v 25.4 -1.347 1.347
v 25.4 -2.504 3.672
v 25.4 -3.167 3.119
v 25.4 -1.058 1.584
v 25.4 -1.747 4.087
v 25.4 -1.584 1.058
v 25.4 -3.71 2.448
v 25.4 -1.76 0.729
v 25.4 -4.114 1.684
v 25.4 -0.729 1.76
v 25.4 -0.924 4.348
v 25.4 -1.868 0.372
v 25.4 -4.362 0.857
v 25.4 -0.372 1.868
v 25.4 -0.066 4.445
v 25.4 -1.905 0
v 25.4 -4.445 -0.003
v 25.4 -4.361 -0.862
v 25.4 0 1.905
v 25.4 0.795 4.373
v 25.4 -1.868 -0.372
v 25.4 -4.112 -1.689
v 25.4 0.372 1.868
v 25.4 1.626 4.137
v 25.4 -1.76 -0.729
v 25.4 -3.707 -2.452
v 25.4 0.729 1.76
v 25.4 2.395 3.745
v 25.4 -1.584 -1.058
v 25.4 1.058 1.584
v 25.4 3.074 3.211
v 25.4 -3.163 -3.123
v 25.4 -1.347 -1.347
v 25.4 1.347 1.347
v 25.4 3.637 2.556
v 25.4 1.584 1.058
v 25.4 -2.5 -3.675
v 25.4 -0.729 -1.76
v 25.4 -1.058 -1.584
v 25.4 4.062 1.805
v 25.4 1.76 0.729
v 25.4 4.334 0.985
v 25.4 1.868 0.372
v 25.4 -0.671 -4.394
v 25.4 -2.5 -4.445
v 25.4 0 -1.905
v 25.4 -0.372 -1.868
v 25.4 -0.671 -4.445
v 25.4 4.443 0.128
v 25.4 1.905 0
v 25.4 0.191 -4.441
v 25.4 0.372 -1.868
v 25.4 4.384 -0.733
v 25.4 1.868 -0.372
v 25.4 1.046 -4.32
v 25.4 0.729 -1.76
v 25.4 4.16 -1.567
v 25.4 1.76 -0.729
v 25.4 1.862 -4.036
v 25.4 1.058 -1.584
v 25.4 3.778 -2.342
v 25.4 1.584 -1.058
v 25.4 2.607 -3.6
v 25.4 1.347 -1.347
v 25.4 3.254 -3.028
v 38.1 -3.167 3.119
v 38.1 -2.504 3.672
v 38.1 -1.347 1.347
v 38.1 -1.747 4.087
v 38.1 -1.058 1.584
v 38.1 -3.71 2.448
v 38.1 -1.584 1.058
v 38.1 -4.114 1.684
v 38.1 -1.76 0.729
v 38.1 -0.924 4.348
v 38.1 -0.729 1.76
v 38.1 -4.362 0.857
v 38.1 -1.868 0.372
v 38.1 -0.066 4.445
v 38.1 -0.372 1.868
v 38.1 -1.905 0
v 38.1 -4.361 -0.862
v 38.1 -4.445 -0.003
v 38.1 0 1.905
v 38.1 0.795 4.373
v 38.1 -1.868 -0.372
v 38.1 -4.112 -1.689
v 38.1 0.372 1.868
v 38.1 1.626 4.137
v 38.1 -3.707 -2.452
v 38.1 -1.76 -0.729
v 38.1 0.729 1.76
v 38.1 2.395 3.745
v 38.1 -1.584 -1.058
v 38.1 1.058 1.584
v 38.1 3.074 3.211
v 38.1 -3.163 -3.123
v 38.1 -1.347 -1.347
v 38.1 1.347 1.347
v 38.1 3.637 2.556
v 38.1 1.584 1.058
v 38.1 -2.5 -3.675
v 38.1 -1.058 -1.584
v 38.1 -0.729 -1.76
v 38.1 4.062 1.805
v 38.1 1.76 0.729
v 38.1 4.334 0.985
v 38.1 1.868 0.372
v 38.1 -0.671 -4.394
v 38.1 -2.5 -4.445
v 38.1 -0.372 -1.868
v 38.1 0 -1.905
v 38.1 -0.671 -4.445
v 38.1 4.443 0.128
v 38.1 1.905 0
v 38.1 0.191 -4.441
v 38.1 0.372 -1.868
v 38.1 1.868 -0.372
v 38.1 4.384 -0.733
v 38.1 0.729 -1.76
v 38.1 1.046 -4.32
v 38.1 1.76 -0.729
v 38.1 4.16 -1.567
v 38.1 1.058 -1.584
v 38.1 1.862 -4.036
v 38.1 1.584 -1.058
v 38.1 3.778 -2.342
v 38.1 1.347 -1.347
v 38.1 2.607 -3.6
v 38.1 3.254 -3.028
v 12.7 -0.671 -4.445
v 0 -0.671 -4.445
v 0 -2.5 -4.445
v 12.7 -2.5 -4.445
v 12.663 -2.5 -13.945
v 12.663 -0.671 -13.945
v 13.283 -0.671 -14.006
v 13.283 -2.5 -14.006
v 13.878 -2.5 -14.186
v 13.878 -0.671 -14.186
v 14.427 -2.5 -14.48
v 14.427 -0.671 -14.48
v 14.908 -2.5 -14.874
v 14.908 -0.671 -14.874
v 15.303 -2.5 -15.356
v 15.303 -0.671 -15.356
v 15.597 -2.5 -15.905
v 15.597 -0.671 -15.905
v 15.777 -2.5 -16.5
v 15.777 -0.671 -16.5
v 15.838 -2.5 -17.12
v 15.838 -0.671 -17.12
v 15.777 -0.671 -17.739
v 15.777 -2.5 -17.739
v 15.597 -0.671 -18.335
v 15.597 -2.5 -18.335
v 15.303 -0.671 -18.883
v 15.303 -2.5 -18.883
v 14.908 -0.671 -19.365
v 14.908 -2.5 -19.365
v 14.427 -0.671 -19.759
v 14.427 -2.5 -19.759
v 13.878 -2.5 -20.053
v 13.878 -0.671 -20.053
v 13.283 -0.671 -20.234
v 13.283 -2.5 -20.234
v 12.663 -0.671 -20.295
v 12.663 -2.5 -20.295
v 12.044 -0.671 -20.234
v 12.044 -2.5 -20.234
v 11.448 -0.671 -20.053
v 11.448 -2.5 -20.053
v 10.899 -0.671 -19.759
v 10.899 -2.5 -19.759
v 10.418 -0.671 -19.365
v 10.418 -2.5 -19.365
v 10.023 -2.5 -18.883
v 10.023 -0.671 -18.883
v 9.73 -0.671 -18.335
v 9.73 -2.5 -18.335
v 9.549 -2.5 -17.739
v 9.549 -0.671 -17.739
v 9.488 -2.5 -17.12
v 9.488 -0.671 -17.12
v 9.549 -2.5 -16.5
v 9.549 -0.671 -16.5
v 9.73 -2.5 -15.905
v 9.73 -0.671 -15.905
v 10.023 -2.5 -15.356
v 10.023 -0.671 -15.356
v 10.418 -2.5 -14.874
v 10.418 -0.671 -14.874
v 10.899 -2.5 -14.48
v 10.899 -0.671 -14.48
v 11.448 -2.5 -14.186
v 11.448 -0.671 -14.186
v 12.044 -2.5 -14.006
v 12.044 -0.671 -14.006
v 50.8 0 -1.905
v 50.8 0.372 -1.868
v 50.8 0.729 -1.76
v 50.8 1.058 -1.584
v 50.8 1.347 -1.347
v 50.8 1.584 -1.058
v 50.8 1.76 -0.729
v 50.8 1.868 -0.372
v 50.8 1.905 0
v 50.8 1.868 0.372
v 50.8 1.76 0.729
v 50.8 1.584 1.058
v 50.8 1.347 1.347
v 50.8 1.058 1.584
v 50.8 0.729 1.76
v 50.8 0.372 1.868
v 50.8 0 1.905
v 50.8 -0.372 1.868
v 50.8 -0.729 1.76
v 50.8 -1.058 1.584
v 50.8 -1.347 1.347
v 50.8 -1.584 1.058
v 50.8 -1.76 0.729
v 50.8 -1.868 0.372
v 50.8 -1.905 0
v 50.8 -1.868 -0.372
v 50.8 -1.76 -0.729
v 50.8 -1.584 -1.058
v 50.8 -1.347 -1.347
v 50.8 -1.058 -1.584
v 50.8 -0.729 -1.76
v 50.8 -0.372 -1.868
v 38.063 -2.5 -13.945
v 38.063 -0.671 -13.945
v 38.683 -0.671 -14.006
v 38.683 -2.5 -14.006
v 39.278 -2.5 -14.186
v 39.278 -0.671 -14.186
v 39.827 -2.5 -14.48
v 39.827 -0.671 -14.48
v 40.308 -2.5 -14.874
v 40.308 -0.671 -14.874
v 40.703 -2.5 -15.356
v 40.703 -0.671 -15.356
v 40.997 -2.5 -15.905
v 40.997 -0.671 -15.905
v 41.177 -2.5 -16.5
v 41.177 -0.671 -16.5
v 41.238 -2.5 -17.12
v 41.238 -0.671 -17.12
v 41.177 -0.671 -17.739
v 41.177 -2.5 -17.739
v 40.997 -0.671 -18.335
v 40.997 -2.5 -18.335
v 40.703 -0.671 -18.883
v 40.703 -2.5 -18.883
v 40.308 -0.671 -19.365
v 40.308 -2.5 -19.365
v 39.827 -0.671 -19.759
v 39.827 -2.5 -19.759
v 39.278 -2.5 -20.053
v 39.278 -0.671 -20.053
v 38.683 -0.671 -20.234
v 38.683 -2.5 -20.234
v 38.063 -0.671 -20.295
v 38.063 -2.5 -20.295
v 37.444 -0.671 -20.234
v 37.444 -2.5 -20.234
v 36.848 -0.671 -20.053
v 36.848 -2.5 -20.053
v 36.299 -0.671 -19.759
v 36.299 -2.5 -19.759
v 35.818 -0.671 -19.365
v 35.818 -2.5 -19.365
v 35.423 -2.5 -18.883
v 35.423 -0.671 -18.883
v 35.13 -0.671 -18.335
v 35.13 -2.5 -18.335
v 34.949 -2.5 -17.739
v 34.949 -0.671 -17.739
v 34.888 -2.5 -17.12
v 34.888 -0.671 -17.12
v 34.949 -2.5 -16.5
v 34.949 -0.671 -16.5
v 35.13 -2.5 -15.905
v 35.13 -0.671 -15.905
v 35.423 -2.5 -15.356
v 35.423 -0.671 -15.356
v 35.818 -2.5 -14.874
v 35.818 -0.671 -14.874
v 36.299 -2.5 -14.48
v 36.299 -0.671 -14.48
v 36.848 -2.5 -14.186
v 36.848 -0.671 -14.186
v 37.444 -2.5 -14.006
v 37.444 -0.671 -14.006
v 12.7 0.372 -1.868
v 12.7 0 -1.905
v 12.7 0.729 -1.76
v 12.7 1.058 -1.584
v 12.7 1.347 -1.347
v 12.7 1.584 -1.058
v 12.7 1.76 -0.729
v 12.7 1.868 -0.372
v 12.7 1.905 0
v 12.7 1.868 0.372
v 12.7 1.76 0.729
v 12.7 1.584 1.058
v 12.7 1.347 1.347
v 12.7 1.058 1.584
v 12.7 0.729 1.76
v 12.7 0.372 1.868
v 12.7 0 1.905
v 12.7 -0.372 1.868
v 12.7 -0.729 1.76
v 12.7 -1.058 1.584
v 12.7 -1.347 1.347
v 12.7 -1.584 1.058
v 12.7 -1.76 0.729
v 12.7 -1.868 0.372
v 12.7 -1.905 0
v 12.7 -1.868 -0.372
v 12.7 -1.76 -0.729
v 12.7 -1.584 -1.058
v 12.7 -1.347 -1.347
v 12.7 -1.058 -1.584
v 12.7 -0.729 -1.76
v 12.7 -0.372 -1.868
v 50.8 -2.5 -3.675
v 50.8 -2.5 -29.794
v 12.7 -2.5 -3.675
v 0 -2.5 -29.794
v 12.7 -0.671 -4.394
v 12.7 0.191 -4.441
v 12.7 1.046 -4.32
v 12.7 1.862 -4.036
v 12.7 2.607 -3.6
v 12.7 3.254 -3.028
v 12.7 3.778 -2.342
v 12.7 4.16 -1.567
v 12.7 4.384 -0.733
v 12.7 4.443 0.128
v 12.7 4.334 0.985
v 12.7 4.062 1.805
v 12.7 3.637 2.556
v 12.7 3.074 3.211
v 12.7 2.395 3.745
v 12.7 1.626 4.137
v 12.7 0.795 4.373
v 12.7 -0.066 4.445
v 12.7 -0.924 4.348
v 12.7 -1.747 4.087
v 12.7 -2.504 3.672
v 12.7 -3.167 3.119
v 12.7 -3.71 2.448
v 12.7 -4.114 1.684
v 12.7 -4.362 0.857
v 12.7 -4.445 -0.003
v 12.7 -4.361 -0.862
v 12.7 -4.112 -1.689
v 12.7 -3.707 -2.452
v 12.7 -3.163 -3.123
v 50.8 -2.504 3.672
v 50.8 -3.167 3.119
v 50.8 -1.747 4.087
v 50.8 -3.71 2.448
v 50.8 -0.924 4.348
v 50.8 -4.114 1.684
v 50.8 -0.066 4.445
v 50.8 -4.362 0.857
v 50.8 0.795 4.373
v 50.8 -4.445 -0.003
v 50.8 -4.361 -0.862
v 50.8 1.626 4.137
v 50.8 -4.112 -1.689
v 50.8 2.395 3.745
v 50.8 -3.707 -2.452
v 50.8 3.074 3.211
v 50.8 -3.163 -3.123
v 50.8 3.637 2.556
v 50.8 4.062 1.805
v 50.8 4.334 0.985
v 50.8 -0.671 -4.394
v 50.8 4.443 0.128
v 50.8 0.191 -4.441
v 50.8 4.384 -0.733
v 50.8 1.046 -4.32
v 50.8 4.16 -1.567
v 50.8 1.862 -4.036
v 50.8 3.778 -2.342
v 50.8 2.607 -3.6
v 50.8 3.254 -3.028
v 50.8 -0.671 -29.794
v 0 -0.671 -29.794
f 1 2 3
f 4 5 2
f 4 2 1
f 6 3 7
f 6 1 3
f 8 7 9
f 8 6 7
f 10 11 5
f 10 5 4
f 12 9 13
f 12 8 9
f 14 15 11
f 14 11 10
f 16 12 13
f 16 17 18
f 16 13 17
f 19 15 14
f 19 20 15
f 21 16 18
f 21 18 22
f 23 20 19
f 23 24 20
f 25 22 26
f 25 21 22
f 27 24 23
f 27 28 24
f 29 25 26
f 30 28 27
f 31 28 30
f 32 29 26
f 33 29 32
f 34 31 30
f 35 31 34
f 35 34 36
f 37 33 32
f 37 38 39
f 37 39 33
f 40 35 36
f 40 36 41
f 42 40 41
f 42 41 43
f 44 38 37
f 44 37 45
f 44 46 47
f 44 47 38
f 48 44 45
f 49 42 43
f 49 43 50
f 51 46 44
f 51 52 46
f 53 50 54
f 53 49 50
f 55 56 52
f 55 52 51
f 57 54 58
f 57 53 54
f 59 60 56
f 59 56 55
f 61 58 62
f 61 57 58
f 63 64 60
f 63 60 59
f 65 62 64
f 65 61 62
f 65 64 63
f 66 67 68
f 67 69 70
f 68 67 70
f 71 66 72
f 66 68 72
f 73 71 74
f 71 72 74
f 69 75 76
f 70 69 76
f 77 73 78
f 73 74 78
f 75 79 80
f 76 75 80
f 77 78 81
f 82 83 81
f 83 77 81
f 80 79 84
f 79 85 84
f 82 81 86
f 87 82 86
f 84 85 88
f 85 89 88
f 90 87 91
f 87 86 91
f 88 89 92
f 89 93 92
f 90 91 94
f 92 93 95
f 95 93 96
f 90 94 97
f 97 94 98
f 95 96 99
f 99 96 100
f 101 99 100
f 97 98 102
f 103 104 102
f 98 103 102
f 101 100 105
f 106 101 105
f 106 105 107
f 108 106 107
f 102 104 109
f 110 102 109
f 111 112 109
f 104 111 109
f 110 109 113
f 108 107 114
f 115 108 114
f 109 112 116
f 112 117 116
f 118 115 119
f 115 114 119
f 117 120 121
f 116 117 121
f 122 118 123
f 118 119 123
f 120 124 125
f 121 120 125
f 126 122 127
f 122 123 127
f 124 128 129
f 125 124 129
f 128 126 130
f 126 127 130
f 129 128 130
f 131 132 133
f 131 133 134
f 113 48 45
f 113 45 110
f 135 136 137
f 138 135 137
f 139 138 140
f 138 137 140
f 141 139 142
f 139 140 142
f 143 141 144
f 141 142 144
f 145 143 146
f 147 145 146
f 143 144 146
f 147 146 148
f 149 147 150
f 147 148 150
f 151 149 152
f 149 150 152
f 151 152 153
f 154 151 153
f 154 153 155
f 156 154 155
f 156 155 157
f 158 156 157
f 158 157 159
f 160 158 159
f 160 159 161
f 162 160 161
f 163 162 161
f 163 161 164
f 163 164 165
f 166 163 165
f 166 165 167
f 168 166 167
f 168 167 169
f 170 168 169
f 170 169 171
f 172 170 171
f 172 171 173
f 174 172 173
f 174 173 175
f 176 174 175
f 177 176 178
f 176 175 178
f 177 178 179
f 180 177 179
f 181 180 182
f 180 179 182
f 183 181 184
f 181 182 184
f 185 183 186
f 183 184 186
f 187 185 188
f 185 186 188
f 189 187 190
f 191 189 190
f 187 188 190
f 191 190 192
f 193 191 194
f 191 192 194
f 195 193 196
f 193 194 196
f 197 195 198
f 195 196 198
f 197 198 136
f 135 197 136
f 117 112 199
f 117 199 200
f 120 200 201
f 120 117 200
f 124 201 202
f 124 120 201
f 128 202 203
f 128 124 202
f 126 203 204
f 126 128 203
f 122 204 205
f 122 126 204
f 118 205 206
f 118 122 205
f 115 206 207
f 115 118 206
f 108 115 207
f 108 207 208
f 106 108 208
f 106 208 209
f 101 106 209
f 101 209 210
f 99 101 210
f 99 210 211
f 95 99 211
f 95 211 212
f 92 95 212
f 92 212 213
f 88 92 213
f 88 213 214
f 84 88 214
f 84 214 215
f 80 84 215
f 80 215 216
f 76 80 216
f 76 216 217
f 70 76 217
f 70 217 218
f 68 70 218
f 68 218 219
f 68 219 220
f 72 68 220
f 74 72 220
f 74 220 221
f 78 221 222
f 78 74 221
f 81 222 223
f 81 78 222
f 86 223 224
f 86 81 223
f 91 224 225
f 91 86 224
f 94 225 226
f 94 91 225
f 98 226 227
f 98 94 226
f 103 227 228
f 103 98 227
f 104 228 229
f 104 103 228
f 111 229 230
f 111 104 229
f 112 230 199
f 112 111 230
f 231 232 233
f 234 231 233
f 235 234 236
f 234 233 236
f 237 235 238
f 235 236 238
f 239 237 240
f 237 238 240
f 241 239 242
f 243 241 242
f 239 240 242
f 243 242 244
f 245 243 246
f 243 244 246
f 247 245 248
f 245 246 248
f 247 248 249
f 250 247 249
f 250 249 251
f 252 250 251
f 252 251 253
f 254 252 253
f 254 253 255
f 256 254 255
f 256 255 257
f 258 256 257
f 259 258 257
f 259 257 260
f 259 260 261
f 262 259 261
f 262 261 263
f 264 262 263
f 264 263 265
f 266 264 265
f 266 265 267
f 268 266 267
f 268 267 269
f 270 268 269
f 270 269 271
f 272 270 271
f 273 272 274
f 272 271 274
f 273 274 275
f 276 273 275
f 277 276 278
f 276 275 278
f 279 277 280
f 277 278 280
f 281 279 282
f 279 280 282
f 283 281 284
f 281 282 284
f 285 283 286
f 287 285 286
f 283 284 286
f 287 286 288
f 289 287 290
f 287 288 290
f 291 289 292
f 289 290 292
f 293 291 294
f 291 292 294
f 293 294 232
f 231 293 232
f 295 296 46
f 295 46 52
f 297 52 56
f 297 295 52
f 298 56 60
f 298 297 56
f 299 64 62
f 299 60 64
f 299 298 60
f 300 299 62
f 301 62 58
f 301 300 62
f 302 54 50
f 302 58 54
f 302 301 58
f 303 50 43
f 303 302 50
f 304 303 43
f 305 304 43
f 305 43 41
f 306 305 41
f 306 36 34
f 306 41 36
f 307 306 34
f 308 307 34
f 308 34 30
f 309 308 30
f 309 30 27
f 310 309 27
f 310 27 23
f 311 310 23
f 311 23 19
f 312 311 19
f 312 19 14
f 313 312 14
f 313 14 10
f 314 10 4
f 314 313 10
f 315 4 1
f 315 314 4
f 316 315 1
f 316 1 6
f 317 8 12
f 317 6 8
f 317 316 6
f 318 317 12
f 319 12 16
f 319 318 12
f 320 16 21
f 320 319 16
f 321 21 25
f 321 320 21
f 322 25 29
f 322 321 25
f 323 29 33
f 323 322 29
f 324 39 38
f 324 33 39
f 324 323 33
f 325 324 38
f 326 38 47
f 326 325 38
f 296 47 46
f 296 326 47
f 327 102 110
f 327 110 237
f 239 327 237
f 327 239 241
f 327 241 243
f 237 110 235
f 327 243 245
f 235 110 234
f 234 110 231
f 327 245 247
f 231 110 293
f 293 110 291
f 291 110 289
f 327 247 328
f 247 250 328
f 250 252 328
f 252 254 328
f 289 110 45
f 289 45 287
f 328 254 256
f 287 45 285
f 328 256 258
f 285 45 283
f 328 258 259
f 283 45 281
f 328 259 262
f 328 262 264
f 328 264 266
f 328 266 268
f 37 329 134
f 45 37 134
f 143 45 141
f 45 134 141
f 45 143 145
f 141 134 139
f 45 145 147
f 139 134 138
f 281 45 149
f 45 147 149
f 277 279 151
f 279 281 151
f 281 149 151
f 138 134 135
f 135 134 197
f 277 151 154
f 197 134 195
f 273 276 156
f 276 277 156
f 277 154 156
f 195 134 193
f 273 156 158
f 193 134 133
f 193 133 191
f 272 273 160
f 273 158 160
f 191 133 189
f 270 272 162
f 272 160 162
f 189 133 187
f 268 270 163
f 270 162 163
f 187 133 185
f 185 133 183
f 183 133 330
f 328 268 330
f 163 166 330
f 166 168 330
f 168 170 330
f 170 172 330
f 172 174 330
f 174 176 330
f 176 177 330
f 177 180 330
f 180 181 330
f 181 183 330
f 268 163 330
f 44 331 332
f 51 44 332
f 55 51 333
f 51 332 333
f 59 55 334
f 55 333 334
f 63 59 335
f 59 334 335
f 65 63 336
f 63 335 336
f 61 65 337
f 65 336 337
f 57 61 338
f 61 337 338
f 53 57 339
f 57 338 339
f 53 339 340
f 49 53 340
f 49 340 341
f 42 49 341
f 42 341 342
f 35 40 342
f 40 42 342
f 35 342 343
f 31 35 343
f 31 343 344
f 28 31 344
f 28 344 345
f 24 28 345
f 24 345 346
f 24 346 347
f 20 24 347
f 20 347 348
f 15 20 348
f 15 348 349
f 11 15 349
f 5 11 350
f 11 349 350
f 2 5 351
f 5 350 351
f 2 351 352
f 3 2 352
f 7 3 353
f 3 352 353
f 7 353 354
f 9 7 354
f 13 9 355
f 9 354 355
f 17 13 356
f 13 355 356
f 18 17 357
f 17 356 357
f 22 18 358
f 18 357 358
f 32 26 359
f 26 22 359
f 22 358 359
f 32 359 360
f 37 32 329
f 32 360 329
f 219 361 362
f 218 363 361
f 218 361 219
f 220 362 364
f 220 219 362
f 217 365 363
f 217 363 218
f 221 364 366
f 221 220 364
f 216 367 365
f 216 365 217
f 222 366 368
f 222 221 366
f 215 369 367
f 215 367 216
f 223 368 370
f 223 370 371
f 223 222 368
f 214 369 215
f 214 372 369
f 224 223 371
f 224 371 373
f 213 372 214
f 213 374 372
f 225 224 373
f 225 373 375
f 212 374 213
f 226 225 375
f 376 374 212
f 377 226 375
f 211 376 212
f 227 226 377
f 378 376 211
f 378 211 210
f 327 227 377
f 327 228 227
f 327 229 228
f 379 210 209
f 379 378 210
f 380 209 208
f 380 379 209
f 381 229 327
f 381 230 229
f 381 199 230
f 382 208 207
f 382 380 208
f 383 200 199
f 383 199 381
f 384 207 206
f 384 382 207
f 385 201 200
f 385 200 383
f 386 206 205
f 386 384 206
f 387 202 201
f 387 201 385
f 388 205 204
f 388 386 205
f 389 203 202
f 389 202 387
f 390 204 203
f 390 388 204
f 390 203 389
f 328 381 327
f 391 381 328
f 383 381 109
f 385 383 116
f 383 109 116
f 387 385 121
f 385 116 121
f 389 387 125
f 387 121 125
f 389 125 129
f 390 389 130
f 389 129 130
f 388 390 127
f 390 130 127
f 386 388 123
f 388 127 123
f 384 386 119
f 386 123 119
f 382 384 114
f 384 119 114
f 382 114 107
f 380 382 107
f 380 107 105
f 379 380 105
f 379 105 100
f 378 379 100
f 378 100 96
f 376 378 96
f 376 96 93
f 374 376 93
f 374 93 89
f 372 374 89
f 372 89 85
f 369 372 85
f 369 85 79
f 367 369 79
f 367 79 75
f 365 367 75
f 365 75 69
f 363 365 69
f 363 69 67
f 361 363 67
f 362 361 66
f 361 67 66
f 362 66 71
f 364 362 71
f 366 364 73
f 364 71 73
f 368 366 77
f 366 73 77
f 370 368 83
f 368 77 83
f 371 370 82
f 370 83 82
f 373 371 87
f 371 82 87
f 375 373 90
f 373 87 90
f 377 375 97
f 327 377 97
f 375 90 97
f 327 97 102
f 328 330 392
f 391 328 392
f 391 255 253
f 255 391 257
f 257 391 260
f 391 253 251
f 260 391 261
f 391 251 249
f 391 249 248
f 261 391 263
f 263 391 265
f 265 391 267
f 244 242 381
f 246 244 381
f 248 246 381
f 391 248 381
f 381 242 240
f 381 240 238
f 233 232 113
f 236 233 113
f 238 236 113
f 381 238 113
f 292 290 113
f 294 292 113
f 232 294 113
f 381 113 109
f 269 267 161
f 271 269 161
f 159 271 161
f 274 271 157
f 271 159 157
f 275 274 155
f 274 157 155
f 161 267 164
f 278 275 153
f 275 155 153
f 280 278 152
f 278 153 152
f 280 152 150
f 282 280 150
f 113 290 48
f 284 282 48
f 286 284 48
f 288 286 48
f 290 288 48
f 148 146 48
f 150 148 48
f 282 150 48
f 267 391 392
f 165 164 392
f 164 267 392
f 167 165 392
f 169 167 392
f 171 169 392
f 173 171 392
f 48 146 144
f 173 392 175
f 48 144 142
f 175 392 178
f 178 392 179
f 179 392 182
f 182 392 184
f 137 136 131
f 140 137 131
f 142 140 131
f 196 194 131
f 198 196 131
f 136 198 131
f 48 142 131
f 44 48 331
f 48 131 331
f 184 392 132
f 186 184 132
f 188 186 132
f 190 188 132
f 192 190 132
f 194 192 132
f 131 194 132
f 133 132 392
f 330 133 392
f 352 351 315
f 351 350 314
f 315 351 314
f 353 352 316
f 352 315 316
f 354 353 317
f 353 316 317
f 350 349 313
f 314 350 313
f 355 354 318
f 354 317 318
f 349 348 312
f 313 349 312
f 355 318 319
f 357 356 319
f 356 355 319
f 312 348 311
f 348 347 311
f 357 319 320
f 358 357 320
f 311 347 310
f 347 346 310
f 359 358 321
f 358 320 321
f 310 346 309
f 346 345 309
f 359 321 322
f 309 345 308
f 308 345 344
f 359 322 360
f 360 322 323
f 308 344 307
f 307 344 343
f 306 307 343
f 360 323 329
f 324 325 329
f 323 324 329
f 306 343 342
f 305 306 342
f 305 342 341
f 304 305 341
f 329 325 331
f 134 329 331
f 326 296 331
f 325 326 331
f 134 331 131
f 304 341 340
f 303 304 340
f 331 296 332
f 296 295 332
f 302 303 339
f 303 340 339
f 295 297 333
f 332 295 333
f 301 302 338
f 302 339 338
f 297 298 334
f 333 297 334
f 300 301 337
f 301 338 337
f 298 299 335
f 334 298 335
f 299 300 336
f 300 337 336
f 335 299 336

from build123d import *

# Parameters (mm, degrees)
SKETCH4_R           = 1.905
BOSS_EXTRUDE2_DEPTH = 50.8
SKETCH5_W           = 12.7
SKETCH5_H           = 8.89
CUT_EXTRUDE2_DEPTH  = 62.885856388
SKETCH6_R           = 3.175
CUT_EXTRUDE3_DEPTH  = 60.114292576


with BuildPart() as part:
    # Sketch4 → Boss-Extrude2 (new body)
    with BuildSketch(Plane(origin=(0, 0, 0), x_dir=(0, 0, -1), z_dir=(1, 0, 0))):
        with BuildLine():
            Line((29.794065187, -0.670981472), (4.394065187, -0.670981472))
            ThreePointArc((4.394065187, -0.670981472), (-4.137088067, 1.625585225), (3.675475152, -2.499781472))
            Line((3.675475152, -2.499781472), (29.794065187, -2.499781472))
            Line((29.794065187, -2.499781472), (29.794065187, -0.670981472))
        make_face()
        Circle(SKETCH4_R, mode=Mode.SUBTRACT)
    extrude(amount=BOSS_EXTRUDE2_DEPTH)

    # Sketch5 → Cut-Extrude2 (cut, through all)
    with BuildSketch(Plane(origin=(0, 14.569018528, 0), x_dir=(1, 0, 0), z_dir=(0, 1, 0))):
        with Locations((6.35, 0)):
            Rectangle(SKETCH5_W, SKETCH5_H)
        with Locations((31.75, 0)):
            Rectangle(SKETCH5_W, SKETCH5_H)
    extrude(amount=-CUT_EXTRUDE2_DEPTH, mode=Mode.SUBTRACT)

    # Sketch6 → Cut-Extrude3 (cut, through all)
    with BuildSketch(Plane(origin=(0, -0.670981472, 0), x_dir=(1, 0, 0), z_dir=(0, 1, 0))):
        with Locations(Location((12.663329801, 17.119532593, 0), (0, 0, 270))):
            Circle(SKETCH6_R)
        with Locations(Location((38.063329801, 17.119532593, 0), (0, 0, 270))):
            Circle(SKETCH6_R)
    extrude(amount=-CUT_EXTRUDE3_DEPTH, mode=Mode.SUBTRACT)


solid = part.part
